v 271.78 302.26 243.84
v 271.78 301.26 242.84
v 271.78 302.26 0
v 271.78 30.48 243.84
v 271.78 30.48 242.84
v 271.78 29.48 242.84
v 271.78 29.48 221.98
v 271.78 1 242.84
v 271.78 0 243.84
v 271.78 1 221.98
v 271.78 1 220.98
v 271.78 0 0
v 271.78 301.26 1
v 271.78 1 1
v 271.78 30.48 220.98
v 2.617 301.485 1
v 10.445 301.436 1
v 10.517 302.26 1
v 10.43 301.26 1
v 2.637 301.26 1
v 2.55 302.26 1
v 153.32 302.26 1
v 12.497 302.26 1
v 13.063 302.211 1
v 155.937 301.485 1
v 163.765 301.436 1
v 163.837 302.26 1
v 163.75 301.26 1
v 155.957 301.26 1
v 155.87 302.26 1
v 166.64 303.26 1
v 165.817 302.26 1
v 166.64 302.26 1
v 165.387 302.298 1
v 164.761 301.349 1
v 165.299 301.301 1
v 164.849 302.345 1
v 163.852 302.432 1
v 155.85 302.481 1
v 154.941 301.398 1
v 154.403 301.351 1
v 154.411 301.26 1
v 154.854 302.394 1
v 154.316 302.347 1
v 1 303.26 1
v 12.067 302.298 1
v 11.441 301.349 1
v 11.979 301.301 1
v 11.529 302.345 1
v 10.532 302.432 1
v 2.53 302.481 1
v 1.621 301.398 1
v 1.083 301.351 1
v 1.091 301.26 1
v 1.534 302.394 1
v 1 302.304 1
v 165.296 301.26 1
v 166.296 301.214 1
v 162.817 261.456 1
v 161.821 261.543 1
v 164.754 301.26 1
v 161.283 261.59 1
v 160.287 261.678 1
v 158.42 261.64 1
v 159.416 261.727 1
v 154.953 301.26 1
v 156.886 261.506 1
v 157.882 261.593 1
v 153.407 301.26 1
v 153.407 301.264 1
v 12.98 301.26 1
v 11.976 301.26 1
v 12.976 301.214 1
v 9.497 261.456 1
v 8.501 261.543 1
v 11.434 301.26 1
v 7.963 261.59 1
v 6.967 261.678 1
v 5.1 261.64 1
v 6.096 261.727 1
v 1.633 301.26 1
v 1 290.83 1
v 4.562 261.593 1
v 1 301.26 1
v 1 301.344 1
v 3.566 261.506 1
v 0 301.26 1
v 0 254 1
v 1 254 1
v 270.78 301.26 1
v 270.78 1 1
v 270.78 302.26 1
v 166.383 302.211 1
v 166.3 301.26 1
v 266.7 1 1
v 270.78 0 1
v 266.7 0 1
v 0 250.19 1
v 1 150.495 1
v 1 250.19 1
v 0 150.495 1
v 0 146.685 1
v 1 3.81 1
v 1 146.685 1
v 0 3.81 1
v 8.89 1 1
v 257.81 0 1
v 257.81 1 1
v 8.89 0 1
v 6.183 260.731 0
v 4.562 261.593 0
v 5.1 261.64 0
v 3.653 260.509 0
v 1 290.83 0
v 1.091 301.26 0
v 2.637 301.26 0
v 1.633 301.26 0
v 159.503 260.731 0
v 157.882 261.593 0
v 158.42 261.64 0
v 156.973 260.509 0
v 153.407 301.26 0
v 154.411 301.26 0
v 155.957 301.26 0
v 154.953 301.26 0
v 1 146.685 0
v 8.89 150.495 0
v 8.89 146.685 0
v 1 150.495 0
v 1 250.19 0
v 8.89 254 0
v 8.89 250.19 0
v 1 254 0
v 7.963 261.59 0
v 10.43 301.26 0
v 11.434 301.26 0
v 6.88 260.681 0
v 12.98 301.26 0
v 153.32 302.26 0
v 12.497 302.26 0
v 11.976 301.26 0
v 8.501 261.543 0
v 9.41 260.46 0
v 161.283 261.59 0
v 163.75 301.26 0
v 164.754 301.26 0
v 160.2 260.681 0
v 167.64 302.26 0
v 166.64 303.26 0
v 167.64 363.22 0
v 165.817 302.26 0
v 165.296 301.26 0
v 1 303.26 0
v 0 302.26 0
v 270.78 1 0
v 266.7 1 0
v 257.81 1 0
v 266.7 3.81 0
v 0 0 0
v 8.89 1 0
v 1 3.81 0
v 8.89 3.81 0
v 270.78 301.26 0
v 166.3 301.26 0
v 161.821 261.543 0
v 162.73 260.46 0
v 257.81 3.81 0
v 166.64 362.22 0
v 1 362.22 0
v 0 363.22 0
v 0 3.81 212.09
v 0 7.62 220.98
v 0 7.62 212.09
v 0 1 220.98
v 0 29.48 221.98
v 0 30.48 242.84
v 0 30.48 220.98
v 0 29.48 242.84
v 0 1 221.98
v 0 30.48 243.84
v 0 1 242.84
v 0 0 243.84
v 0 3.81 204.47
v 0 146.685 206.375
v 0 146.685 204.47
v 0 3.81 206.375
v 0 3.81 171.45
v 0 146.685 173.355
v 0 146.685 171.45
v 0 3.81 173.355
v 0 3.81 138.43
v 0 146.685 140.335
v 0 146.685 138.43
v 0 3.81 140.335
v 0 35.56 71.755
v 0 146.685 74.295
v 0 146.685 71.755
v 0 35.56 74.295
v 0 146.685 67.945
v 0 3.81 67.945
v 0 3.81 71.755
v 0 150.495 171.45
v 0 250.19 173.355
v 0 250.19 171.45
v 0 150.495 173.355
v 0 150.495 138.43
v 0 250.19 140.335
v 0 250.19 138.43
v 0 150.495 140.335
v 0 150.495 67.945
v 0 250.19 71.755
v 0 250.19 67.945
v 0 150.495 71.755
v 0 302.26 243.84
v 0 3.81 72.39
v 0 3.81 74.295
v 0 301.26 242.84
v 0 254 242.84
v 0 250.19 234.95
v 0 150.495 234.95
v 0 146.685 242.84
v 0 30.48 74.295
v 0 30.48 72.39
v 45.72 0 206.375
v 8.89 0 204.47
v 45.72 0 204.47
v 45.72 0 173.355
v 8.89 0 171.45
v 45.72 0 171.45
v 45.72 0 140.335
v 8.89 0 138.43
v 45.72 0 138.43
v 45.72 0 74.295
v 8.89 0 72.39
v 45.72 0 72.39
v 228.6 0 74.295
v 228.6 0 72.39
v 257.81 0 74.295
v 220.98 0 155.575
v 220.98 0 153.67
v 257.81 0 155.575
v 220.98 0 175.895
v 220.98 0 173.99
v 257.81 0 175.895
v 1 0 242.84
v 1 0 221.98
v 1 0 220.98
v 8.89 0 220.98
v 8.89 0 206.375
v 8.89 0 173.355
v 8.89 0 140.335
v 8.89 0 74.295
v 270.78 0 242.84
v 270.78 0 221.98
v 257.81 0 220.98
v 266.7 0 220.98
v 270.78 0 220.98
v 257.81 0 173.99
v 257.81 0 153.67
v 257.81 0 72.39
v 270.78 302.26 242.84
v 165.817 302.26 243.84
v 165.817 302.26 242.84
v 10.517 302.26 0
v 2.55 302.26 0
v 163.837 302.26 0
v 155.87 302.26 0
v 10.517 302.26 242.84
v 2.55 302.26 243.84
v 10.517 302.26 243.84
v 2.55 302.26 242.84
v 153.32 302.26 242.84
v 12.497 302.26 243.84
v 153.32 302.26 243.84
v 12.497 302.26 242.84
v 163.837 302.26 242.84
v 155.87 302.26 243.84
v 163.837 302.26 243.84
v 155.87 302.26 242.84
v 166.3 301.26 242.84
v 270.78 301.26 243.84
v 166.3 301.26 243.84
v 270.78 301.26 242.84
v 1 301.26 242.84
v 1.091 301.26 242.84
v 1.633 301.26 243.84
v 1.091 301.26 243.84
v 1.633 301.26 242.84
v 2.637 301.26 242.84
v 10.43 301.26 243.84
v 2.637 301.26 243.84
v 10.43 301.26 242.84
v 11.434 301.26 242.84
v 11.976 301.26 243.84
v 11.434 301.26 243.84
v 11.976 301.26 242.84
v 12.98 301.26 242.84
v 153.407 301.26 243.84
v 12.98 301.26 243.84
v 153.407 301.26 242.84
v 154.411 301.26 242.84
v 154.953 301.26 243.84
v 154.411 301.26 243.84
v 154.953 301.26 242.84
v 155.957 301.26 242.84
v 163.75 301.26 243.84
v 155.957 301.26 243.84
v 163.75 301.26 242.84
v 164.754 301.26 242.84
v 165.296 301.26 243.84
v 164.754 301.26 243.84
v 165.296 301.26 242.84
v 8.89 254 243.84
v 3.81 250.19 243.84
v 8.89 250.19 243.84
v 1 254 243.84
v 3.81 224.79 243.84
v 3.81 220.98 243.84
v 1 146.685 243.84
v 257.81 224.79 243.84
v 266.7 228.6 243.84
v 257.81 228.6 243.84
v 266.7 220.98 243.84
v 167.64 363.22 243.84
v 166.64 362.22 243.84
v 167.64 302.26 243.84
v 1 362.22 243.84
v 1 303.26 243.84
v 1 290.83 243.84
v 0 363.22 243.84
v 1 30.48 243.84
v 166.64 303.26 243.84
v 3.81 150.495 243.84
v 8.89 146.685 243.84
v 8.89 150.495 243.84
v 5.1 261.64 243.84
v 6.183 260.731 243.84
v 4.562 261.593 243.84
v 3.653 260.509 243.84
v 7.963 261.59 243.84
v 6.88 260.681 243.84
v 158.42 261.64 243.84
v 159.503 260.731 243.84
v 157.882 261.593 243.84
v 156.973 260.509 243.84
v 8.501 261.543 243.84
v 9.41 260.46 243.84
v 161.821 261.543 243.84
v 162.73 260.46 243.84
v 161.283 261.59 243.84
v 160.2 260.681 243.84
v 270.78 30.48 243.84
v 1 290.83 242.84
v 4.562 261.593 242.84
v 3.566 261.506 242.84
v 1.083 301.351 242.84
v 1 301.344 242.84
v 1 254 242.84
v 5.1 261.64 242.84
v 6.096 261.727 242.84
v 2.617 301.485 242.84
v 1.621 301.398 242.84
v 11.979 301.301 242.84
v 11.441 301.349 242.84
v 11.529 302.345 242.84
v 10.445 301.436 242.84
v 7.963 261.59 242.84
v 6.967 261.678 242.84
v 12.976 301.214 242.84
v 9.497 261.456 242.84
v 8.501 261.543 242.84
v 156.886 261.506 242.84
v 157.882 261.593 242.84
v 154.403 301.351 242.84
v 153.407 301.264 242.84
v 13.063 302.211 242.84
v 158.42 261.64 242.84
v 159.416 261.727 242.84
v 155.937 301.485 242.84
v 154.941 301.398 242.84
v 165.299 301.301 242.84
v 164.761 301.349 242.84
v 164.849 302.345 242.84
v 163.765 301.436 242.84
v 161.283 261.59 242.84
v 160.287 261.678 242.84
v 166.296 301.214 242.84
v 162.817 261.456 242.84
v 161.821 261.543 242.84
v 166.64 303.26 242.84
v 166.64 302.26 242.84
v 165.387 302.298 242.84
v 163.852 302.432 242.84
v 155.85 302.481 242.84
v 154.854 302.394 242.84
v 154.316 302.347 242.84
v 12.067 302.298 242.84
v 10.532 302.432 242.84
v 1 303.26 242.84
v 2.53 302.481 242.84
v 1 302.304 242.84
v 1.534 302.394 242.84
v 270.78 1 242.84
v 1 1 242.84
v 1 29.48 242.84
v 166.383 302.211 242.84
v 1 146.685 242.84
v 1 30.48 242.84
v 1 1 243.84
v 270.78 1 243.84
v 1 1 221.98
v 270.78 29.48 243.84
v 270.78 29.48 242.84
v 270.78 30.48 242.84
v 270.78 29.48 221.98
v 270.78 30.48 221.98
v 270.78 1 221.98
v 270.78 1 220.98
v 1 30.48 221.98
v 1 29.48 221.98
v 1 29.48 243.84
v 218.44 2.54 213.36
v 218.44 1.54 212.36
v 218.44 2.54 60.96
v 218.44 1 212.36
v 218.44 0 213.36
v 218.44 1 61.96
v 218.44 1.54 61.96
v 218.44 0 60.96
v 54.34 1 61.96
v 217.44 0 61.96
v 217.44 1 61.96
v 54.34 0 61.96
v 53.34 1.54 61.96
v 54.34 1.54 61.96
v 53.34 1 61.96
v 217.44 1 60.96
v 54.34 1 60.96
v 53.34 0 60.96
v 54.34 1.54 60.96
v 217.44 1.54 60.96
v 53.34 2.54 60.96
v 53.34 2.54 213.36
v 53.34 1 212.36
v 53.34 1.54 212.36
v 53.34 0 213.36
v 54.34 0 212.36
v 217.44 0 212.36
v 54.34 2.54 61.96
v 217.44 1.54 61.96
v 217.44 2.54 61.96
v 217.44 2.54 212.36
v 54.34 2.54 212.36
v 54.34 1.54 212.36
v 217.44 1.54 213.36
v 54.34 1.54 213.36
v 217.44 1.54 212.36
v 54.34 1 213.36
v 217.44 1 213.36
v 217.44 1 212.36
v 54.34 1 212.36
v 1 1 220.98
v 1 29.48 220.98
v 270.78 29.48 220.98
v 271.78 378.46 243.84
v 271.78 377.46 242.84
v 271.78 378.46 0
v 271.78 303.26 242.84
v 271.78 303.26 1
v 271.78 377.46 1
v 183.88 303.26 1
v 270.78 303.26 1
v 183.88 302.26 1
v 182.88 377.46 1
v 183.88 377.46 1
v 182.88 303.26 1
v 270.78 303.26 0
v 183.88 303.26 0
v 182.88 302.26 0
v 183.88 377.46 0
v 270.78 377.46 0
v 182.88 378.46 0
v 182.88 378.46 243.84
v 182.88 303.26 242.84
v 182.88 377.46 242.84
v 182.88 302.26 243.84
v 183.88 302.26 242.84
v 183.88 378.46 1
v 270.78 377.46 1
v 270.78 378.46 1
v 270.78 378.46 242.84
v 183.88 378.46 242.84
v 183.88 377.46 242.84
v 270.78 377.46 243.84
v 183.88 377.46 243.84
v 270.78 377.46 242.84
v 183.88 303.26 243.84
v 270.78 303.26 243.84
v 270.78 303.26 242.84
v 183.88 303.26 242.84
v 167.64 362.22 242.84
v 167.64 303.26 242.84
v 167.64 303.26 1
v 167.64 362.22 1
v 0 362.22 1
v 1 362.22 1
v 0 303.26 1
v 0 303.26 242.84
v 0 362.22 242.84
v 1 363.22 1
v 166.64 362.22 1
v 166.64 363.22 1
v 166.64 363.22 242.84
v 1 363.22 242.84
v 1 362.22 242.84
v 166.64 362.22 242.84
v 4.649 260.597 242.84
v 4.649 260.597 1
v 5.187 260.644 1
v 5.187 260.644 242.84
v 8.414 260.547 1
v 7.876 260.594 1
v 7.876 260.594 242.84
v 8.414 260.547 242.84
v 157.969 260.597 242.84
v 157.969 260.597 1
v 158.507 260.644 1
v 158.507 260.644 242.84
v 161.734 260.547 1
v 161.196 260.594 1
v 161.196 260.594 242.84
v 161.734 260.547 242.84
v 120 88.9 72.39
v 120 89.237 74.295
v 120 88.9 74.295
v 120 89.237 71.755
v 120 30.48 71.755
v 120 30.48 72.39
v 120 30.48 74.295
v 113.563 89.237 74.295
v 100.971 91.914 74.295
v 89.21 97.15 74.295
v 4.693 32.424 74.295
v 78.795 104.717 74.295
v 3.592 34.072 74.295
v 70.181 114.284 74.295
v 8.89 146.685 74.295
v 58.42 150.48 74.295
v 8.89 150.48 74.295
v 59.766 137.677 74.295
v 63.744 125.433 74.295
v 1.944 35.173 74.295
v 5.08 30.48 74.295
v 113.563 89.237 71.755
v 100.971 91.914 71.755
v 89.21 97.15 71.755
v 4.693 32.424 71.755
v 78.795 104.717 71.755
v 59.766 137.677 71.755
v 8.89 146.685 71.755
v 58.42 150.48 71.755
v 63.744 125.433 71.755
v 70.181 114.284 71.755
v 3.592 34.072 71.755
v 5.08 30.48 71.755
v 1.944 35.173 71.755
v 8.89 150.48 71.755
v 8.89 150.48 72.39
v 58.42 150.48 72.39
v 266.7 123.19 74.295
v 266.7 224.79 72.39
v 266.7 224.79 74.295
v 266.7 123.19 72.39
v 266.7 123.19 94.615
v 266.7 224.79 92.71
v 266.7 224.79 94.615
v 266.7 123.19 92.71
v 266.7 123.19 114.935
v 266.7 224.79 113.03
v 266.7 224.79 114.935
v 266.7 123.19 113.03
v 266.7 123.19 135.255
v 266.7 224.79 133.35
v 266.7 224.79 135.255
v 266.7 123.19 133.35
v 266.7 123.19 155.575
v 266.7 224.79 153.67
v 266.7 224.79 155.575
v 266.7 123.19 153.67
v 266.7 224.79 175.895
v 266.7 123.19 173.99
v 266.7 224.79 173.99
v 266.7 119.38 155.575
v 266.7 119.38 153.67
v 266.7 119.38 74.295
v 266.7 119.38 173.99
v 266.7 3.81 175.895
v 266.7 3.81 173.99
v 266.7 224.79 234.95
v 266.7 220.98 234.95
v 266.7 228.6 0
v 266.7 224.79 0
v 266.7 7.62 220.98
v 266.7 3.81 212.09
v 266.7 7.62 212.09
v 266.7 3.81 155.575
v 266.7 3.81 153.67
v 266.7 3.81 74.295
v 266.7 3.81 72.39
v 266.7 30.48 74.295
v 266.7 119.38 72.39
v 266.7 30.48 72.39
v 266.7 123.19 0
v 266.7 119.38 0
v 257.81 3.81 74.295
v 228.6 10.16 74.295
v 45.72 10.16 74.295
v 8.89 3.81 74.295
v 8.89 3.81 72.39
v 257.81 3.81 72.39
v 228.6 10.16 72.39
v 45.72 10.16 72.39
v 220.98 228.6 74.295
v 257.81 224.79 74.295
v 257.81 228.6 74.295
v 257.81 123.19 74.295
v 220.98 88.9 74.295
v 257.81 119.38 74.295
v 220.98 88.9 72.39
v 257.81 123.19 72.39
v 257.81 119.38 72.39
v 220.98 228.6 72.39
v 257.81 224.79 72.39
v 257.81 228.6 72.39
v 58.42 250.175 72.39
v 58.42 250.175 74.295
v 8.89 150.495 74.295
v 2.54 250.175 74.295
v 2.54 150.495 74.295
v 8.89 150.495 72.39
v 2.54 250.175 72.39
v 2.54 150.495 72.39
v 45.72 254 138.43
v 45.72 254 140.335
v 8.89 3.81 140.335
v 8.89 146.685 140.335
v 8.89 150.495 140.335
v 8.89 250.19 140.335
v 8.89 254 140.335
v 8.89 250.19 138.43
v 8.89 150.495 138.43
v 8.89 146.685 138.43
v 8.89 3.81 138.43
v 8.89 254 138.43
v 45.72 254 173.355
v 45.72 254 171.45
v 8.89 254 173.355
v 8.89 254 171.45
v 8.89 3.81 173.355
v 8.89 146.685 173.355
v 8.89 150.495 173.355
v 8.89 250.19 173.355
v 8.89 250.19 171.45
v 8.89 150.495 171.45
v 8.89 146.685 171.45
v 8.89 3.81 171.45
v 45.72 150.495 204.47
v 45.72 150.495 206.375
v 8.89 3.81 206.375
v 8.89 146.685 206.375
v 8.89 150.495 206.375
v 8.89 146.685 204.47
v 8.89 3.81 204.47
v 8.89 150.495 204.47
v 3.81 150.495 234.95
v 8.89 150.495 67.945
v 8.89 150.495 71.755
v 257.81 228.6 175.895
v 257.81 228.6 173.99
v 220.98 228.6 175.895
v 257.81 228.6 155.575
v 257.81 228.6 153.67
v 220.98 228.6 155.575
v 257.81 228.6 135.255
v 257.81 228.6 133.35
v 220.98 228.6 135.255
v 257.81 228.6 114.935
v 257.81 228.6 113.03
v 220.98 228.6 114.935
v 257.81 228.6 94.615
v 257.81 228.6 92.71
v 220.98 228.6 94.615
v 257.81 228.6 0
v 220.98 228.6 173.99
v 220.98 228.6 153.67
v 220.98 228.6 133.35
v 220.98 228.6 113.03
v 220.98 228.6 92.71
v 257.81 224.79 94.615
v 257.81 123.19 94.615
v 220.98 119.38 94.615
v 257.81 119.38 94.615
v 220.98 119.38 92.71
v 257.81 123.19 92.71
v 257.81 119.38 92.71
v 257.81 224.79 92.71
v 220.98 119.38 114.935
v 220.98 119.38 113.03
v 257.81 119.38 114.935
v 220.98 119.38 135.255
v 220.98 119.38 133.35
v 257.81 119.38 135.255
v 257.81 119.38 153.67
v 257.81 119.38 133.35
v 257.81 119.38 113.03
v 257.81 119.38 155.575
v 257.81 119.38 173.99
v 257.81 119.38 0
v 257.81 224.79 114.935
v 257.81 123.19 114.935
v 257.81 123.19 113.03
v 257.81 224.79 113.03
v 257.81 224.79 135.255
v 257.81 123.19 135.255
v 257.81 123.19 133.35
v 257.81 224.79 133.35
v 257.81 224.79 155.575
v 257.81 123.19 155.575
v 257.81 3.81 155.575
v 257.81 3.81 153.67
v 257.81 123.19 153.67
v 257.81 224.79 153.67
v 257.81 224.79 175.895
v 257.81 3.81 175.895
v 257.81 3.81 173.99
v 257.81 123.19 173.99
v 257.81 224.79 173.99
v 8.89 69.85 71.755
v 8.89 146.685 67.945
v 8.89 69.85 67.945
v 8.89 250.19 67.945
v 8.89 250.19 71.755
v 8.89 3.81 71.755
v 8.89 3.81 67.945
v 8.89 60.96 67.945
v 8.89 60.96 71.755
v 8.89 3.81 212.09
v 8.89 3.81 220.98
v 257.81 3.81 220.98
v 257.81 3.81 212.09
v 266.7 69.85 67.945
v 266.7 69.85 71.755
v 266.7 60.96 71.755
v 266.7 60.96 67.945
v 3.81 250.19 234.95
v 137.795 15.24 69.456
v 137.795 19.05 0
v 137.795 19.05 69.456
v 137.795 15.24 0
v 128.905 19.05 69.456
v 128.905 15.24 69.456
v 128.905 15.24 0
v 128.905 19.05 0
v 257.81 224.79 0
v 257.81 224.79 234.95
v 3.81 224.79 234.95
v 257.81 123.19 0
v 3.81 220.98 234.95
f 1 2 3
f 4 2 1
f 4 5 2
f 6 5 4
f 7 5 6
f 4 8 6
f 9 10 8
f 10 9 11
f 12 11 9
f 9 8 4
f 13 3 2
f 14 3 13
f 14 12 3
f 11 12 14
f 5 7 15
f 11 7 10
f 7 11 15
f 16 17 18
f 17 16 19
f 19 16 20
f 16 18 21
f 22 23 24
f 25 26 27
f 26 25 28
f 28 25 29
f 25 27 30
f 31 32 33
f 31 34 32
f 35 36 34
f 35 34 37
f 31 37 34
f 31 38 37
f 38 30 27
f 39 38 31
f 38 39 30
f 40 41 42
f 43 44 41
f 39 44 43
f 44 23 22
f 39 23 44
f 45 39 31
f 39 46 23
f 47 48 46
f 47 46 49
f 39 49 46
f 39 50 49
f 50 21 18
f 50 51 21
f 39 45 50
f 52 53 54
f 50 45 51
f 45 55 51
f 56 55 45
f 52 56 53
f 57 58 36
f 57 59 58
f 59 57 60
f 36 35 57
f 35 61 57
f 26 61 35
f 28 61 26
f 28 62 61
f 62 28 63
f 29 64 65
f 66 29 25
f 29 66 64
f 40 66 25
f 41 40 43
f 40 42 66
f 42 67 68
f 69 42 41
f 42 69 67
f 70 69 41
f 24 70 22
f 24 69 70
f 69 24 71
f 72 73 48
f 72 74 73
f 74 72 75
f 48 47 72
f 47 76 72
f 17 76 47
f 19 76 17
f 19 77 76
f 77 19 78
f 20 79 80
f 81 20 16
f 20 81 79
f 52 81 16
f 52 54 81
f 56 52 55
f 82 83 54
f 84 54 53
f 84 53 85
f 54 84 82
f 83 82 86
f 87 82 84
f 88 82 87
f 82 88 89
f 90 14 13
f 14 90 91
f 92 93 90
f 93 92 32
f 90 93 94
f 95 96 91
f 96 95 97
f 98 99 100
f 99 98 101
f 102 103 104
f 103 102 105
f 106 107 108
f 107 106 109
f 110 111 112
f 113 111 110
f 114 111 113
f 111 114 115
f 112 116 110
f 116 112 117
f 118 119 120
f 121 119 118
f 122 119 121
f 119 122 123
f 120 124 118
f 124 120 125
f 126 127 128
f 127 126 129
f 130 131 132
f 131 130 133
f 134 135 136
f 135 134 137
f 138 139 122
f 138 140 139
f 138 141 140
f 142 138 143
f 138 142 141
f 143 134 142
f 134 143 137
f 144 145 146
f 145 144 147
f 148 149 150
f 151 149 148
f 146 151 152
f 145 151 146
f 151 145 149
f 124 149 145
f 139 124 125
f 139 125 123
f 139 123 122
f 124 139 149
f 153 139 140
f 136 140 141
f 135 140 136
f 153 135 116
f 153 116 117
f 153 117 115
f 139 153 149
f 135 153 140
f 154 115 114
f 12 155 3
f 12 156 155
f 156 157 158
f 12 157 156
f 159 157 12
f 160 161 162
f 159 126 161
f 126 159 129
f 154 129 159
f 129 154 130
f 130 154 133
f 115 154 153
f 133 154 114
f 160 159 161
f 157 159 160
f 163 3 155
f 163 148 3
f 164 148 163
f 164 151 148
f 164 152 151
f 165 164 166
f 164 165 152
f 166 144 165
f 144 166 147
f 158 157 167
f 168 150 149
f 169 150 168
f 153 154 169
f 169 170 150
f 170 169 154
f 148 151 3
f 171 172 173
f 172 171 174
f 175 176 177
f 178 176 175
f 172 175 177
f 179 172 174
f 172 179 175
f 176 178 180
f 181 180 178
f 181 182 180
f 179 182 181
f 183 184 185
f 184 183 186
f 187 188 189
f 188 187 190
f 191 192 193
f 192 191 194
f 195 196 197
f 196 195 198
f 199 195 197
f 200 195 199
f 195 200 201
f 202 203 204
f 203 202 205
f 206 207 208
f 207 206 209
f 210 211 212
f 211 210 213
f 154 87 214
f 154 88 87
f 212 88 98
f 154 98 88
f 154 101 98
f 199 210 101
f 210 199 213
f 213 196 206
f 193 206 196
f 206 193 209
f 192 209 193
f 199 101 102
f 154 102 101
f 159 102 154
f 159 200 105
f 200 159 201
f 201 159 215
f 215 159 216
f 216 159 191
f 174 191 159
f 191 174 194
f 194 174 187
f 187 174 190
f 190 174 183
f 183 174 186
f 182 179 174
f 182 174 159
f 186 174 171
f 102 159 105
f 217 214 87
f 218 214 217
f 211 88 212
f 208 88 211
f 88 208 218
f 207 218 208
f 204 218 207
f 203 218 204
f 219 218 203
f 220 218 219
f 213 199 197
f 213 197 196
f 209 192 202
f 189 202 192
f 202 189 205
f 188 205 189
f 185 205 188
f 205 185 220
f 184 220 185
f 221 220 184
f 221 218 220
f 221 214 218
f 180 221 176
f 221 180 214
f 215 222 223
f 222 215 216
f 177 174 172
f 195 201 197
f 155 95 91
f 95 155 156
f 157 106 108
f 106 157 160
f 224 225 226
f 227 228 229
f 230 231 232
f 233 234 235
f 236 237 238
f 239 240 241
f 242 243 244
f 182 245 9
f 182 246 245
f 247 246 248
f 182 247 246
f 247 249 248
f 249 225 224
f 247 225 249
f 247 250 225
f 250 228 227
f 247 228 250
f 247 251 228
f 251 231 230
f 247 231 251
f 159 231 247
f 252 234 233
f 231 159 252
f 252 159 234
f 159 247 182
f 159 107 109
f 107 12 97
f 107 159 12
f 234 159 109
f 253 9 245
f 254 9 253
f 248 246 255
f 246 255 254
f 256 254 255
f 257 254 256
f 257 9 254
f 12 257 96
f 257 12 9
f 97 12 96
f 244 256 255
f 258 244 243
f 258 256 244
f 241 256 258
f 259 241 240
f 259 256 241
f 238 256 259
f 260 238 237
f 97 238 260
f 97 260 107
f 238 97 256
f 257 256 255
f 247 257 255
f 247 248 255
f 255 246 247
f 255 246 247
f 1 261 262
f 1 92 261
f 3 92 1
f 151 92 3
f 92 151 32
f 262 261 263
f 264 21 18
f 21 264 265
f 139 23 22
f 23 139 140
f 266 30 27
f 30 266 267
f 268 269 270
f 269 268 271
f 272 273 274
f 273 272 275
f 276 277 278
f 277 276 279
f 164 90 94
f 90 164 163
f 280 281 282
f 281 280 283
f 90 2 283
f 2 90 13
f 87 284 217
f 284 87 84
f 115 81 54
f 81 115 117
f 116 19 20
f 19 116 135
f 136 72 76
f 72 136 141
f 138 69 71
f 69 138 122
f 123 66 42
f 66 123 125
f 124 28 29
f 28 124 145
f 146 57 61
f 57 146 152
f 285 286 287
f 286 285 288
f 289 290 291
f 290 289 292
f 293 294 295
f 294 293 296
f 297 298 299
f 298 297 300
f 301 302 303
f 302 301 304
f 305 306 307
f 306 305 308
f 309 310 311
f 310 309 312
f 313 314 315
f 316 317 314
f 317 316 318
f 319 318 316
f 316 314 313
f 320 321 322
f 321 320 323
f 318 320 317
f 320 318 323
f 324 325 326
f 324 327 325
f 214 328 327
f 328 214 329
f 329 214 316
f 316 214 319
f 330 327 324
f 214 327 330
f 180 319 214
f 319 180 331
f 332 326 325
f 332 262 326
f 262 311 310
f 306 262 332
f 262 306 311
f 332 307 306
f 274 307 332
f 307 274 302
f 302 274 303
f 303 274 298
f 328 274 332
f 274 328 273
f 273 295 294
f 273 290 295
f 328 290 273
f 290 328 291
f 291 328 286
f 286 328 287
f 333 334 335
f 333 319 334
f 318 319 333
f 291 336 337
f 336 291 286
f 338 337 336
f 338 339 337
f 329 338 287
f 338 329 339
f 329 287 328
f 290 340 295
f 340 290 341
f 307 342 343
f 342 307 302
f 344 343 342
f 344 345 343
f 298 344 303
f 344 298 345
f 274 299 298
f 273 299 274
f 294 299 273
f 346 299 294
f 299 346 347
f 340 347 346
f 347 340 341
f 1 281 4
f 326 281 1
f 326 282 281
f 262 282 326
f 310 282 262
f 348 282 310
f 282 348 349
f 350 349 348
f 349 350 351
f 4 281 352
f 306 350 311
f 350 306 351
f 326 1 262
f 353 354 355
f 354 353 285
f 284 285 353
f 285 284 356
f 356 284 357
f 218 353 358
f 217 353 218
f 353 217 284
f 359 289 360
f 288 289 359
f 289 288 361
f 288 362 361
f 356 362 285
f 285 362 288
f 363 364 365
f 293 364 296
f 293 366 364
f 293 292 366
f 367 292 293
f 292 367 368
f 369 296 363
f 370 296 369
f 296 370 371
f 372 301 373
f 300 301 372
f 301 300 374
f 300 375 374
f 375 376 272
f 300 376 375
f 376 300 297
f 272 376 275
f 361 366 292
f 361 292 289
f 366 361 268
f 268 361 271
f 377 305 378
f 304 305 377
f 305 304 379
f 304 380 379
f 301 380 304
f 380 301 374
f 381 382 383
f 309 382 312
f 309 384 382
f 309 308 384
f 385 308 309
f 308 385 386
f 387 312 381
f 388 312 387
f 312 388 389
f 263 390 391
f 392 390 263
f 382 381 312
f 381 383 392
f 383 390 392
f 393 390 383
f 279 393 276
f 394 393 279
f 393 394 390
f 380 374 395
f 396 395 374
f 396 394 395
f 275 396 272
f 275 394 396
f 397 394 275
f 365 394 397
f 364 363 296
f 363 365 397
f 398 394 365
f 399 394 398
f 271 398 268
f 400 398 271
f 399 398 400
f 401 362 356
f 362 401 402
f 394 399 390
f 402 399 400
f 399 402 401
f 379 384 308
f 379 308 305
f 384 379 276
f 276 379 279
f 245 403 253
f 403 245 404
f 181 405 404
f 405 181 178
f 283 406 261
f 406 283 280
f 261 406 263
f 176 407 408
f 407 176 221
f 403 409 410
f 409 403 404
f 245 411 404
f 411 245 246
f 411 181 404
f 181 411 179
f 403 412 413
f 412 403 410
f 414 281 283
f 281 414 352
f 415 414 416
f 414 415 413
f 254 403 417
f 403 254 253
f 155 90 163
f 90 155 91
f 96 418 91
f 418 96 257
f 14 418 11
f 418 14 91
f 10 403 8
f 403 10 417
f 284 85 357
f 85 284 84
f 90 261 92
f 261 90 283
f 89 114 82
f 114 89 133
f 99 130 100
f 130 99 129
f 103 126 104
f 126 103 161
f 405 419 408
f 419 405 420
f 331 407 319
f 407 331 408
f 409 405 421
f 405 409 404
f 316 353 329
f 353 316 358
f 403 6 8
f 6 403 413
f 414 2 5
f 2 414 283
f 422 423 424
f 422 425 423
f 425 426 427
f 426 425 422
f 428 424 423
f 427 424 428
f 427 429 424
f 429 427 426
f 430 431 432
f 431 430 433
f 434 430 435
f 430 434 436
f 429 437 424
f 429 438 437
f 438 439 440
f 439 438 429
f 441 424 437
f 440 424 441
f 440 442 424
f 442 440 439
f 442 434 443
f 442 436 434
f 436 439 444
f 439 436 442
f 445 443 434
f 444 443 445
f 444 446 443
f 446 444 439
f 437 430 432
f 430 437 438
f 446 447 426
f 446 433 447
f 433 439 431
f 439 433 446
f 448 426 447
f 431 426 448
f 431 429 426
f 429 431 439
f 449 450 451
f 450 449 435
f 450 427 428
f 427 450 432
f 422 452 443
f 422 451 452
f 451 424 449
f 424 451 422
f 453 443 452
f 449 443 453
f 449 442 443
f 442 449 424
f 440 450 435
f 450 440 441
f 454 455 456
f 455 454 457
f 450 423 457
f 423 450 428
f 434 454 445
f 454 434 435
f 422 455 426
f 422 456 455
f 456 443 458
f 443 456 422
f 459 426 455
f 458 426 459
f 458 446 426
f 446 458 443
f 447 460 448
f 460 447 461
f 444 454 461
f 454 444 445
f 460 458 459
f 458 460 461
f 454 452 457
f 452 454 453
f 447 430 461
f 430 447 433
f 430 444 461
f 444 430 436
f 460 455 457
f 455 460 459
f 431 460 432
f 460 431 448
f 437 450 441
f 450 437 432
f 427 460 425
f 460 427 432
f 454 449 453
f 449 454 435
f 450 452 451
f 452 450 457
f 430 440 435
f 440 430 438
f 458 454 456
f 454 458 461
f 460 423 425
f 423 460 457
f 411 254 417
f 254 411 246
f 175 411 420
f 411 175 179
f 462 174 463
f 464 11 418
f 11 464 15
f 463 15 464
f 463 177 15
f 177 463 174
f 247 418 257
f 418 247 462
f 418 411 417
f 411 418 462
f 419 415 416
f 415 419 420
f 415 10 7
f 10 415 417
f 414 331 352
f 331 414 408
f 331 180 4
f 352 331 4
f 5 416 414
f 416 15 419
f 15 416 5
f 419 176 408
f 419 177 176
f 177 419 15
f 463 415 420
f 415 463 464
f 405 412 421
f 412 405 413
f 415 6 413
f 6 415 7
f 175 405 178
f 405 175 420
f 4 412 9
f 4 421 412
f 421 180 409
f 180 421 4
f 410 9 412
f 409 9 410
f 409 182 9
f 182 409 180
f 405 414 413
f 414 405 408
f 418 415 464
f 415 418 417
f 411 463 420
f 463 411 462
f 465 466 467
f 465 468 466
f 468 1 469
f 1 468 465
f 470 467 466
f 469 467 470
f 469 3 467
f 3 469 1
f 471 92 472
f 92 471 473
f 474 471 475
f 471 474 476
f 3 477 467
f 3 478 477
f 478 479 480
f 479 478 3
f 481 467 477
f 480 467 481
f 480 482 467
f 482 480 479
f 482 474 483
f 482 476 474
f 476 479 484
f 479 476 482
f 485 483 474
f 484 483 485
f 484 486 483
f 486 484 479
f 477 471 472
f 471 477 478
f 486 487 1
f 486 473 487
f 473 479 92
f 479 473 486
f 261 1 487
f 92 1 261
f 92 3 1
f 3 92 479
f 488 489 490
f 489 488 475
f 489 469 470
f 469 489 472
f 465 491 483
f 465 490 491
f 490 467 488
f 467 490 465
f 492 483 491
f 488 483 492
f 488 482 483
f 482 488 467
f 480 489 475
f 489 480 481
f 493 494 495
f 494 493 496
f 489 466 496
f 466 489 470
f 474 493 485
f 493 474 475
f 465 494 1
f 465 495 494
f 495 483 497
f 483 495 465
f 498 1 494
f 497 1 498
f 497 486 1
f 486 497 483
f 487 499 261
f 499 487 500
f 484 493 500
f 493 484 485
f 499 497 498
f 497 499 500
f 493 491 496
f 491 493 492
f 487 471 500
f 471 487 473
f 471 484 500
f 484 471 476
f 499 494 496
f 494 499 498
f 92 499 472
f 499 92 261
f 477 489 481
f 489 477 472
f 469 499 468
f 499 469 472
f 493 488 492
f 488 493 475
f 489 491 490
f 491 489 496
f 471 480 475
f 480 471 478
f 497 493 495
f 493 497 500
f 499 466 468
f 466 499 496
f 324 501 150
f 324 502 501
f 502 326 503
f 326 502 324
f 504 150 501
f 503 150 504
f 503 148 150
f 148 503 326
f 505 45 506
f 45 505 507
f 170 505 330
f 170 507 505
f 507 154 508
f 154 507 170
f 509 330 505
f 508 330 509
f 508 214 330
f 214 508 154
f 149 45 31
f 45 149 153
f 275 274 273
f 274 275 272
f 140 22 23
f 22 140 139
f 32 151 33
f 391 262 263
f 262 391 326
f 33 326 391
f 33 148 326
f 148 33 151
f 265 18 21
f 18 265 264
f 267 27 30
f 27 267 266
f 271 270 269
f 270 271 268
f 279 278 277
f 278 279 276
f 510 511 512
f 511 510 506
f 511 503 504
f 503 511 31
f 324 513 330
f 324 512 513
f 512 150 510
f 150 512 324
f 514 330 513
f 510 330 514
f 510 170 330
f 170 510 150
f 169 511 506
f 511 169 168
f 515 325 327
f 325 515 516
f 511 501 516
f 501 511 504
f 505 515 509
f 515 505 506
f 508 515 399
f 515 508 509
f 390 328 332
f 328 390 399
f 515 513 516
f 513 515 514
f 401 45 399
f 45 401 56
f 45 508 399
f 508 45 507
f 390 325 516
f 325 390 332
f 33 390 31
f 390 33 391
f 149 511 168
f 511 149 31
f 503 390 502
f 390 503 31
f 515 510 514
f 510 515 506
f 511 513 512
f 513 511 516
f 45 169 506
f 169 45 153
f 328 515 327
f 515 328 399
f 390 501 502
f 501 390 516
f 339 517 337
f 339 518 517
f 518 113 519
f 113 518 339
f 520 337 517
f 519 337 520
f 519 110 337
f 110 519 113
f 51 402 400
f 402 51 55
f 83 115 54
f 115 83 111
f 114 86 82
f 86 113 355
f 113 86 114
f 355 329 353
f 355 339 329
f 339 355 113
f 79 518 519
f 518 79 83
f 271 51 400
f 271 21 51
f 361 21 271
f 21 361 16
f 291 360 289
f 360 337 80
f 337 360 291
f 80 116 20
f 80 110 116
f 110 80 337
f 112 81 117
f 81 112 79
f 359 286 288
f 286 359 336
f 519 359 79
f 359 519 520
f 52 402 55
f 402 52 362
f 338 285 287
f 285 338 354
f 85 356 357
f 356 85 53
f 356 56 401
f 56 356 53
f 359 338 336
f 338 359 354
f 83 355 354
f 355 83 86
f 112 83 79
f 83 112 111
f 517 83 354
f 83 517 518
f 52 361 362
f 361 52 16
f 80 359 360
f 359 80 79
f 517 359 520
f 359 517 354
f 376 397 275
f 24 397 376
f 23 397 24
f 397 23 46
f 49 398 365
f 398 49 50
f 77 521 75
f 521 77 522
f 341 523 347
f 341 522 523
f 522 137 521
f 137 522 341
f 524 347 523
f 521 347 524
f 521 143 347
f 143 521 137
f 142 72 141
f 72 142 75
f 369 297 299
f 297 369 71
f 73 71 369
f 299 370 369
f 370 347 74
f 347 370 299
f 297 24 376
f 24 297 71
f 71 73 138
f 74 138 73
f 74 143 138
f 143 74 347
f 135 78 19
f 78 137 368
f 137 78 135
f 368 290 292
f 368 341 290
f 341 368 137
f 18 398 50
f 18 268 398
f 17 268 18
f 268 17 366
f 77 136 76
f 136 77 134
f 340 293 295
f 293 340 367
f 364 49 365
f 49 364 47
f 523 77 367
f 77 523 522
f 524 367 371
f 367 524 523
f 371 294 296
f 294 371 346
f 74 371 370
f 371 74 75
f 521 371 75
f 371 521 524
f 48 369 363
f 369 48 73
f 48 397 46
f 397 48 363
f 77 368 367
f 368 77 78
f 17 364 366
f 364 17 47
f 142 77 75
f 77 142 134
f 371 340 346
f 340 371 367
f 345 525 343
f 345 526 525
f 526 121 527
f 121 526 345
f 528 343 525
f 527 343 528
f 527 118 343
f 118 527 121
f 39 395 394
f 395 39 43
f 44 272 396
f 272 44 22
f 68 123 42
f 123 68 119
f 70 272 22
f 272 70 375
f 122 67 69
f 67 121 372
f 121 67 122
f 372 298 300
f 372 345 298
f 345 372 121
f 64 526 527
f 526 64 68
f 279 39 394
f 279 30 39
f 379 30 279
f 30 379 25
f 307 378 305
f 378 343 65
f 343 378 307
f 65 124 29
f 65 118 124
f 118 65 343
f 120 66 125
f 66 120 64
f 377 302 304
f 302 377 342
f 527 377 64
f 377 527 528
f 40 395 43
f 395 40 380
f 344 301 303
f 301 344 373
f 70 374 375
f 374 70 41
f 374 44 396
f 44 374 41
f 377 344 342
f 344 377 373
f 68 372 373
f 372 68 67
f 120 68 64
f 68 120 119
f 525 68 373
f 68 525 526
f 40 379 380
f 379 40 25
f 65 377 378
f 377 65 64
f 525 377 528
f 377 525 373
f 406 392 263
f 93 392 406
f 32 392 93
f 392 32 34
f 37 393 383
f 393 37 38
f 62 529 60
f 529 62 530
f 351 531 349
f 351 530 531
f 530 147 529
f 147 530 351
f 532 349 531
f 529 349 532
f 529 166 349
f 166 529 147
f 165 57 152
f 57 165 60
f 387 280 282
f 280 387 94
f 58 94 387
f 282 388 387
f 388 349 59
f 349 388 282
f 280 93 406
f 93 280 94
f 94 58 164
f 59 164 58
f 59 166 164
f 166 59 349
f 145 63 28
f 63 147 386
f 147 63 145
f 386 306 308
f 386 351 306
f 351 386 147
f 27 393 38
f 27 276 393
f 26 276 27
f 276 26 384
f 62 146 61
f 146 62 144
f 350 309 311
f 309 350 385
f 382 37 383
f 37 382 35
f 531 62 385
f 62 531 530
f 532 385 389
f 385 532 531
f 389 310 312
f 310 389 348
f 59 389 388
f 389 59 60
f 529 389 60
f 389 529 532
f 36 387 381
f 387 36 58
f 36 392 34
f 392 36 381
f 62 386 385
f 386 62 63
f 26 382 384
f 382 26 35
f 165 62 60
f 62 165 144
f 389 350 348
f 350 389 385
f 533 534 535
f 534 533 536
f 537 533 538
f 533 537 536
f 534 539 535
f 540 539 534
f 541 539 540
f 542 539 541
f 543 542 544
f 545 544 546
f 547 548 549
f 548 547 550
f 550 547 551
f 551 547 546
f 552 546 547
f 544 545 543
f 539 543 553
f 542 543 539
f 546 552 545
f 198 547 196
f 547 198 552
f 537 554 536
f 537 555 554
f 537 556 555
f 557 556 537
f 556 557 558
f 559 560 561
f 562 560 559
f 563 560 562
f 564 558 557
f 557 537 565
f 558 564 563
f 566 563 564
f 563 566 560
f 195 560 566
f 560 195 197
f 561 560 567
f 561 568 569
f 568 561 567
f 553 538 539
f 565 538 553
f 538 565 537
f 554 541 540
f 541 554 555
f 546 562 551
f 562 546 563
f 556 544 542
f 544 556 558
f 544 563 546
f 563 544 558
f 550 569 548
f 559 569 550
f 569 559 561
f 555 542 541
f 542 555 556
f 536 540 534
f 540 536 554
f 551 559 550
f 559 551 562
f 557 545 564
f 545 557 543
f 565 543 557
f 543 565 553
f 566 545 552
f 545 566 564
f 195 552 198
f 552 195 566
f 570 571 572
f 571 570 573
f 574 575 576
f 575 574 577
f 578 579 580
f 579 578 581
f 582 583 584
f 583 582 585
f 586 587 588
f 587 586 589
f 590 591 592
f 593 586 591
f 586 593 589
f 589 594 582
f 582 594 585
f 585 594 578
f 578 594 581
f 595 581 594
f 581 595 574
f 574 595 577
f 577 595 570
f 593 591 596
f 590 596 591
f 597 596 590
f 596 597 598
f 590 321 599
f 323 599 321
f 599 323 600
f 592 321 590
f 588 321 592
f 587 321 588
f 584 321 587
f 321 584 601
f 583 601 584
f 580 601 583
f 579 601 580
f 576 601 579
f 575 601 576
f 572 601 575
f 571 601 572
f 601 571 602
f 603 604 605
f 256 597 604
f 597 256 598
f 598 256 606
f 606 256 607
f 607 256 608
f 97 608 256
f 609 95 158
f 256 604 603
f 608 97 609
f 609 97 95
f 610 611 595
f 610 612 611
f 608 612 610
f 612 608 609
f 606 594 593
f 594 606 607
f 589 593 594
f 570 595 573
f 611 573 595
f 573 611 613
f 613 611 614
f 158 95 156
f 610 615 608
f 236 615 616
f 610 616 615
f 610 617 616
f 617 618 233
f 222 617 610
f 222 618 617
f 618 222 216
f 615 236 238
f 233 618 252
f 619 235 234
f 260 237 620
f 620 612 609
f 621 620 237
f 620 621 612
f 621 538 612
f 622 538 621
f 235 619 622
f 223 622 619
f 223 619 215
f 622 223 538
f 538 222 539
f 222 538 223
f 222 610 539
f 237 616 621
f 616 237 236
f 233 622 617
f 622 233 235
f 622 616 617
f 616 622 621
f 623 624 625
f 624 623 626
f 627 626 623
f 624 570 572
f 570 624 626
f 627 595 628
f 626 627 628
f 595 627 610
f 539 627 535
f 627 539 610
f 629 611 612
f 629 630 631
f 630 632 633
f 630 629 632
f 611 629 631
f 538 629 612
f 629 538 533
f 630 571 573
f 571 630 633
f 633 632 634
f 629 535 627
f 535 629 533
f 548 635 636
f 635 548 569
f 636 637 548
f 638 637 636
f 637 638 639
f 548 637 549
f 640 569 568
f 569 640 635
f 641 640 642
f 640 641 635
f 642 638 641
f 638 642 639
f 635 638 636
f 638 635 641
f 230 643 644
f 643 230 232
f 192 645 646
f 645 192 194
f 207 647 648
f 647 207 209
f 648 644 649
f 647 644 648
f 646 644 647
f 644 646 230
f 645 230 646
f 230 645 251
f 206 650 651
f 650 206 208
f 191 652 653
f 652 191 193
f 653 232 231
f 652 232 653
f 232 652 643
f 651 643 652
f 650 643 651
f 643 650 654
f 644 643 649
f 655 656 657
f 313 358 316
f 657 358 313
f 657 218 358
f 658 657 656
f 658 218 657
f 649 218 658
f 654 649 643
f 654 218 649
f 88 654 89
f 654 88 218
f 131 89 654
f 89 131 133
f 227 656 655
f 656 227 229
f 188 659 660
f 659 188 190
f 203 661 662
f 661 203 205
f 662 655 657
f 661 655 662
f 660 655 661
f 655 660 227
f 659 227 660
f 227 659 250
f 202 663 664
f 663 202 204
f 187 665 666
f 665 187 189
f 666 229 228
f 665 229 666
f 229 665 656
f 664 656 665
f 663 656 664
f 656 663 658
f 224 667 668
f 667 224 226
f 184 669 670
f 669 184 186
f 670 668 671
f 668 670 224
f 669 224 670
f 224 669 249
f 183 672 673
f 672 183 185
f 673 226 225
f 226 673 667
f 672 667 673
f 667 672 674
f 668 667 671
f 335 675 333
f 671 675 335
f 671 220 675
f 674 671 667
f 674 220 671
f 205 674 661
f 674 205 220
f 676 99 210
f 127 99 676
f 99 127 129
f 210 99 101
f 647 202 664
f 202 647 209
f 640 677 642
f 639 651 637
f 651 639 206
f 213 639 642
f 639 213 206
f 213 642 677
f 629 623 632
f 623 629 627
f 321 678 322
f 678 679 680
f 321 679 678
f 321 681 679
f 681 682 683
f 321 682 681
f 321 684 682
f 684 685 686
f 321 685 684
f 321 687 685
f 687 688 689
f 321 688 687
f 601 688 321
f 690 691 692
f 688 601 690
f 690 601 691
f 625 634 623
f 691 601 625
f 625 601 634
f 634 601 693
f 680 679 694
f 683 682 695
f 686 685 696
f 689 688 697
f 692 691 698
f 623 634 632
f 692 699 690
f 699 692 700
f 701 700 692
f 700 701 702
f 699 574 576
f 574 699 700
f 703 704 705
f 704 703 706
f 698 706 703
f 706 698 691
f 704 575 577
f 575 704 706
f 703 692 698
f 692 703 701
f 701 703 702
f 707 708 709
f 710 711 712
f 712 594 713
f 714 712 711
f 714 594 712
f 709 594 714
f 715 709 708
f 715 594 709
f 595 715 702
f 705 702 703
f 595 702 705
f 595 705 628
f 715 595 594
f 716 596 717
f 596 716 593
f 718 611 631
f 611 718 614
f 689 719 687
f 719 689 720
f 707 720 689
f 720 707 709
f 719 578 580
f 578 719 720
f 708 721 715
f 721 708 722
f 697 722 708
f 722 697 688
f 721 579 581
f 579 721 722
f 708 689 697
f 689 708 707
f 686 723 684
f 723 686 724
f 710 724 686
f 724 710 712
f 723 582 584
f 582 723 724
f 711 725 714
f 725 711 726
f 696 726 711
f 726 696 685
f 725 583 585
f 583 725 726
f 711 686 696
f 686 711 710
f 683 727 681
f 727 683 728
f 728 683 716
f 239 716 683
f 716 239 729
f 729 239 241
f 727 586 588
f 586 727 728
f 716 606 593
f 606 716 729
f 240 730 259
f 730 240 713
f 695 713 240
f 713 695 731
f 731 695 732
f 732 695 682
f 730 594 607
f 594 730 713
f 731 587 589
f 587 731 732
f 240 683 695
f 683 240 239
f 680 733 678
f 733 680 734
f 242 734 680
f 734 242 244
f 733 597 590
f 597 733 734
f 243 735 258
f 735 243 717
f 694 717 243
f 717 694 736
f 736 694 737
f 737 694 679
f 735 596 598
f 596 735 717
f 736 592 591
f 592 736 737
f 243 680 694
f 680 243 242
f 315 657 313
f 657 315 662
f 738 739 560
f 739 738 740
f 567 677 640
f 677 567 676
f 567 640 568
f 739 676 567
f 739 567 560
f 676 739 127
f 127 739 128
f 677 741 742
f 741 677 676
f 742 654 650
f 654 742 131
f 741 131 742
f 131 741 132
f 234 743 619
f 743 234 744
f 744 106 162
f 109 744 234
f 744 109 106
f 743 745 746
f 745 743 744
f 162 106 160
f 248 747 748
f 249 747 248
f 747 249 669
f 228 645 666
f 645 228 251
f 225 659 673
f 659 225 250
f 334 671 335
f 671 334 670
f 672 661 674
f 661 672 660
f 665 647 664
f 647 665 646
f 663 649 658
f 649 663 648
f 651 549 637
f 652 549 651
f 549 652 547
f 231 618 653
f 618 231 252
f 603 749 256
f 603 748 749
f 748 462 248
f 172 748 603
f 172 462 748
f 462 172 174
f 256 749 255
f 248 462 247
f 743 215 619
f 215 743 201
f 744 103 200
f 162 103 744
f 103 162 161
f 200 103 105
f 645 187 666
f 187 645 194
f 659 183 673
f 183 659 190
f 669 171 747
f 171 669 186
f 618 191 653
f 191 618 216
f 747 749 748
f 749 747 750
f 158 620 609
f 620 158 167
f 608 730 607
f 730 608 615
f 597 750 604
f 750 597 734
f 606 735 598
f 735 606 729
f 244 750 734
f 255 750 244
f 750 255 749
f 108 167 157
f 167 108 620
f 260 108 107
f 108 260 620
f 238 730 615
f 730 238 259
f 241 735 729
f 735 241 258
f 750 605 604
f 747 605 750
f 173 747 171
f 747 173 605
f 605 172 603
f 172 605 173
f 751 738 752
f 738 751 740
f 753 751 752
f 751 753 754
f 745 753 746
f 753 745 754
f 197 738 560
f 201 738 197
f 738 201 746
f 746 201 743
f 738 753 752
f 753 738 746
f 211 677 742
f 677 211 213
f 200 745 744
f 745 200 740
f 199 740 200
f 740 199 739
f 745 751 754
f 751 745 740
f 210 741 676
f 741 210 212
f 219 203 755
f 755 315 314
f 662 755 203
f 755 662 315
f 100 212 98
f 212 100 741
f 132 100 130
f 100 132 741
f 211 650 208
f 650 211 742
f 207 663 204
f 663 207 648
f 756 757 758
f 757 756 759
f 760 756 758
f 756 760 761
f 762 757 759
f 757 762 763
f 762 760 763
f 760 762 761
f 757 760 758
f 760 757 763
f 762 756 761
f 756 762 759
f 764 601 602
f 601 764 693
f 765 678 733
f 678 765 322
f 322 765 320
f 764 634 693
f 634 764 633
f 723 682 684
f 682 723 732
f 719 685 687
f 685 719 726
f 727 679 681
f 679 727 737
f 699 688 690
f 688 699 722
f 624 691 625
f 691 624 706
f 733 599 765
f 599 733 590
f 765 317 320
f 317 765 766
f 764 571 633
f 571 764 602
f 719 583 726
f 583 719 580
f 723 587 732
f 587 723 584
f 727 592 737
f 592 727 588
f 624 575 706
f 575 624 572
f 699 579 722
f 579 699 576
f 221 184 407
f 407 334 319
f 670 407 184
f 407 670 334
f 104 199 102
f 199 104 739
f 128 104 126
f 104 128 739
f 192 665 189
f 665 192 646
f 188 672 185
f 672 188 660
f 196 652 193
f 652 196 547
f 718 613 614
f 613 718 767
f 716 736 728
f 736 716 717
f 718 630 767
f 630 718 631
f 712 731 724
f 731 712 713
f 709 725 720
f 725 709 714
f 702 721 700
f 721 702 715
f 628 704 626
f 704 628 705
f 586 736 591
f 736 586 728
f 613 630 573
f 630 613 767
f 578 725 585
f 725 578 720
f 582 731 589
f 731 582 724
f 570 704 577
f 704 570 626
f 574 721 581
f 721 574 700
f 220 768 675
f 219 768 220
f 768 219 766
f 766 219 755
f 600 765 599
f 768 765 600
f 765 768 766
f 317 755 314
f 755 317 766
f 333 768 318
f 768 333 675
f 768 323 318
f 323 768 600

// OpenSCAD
// file: functions.scad
function in(i) = i * 2.54;
function ft(f, i=0) = in(f*12+i);
// file: panels.scad
include <functions.scad>;
include <dimensions.scad>;

module corner_table() {
    color([0.9, 0.9, 0.9])
    difference() {
        cube([120, 120, in(1)]);
        translate([120,120,-1])
        cylinder(r=120-ft(1,11), h=in(3));
        
        translate([0,0,-1])
        cylinder(r=in(2), h=in(3));
    }
}

module front_table_window_insert() {
    difference() {
        cube([room_x,ft(1),in(0.75)]);
        translate([ft(1.5),0,-1])
        cube([ft(6), in(4), in(3)]);
    }
}

module left_table() {
    cube([ft(1.5), ft(4,7), in(0.75)]);
}

module front_left_table() {
    cube([room_x-120, ft(1,11), in(0.75)]);
}


module left_upper_shelf_1() {
    cube([ft(1.5), ft(3,7), in(0.75)]);
}

module left_upper_shelf_2() {
    cube([ft(1.5), ft(3,7), in(0.75)]);
}

module left_upper_shelf_3() {
    cube([ft(1.5), ft(3,7), in(0.75)]);
}

module left_upper_shelf_4() {
    cube([ft(1.5), ft(7,6), in(0.75)]);
}

module left_upper_shelf_5() {
    cube([ft(1.5), ft(7,6), in(0.75)]);
}

module left_lower_shelf() {
    cube([ft(1.5), ft(3,6), in(0.75)]);
}

module right_hinged_table() {
    cube([ft(1,10), ft(3,4.75) - in(1.5), in(0.75)]);
}


module right_upper_shelf_1() {
    cube([ft(1.5), ft(8,4), in(0.75)]);
}

module right_upper_shelf_2() {
    cube([ft(1.5), ft(8,4), in(0.75)]);
}

module right_upper_shelf_3() {
    cube([ft(1.5), ft(4,11.25), in(0.75)]);
}
// file: room.scad
include <functions.scad>;

room_x = ft(8,11);
room_y = ft(9,11);
room_z = ft(8);

wireframe_t = 1;

closet_x = 1.375;

module closet_door() {
    wireframe_cube([ft(closet_x), in(1), room_z], wireframe_t);
}

module wireframe_cube(vect, wireframe_t=5) {
    room_x = vect[0];
    room_y = vect[1];
    room_z = vect[2];

    // along the x axis (short dimension of the room)
    cube([room_x, wireframe_t, wireframe_t]);
    
    translate([0,room_y-wireframe_t,0])
    cube([room_x, wireframe_t, wireframe_t]);

    translate([0,0,room_z-wireframe_t])
    cube([room_x, wireframe_t, wireframe_t]);
    
    translate([0,room_y-wireframe_t,room_z-wireframe_t])
    cube([room_x, wireframe_t, wireframe_t]);

    // verticals
    cube([wireframe_t, wireframe_t, room_z]);
    
    translate([room_x-wireframe_t, 0, 0])
    cube([wireframe_t, wireframe_t, room_z]);
    
    translate([0, room_y-wireframe_t, 0])
    cube([wireframe_t, wireframe_t, room_z]);
    
    translate([room_x-wireframe_t, room_y-wireframe_t, 0])
    cube([wireframe_t, wireframe_t, room_z]);
    
    // along the y axis (long dimension of the room)
    
    cube([wireframe_t, room_y, wireframe_t]);
    
    translate([0, 0, room_z-wireframe_t])
    cube([wireframe_t, room_y, wireframe_t]);

    translate([room_x-wireframe_t, 0, room_z-wireframe_t])
    cube([wireframe_t, room_y, wireframe_t]);
    
    translate([room_x-wireframe_t, 0, 0])
    cube([wireframe_t, room_y, wireframe_t]);
}

module room_wireframe() {
    // room
    wireframe_cube([room_x, room_y, room_z], wireframe_t);
    
    // window
    translate([ft(1.75),0,ft(2)])
    wireframe_cube([ft(5,5), in(1), ft(5)], wireframe_t);
    
    // above window
    translate([0,0,room_z-in(9)])
    wireframe_cube([room_x, ft(1), in(9)], wireframe_t);
    

    // entry
    translate([room_x-ft(2,11),room_y,0])
    wireframe_cube([ft(2,11),ft(2,6),ft(8)], wireframe_t);

    // closet
    translate([0,room_y,0])
    wireframe_cube([ft(5,6),ft(2),ft(8)], wireframe_t);


    translate([0,room_y,0]) {
        rotate([0,0,-85])
        closet_door();
        
        translate([ft(closet_x)*1-32.5,-41.8,0])
        rotate([0,0,85])
        closet_door();
        
        
        translate([ft(closet_x)*2+69.5,0,0])
        rotate([0,0,-85])
        closet_door();
        
        translate([ft(closet_x)*3+37,-41.8,0])
        rotate([0,0,85])
        closet_door();
    }
    
}



room_wireframe();
// file: dimensions.scad
include <functions.scad>;

room_x = ft(8,11) - in(2); // room for padding on either side
room_y = ft(9,11) - in(2); // room for padding against the window side
room_z = ft(8) - in(3); // room for lots of padding underneath, and ceiling clearance

wireframe_t = 1;

closet_x = 1.375;
// main file
include <dimensions.scad>;
use <room.scad>;
use <panels.scad>;

PI=3.1415;

enableAnimation = true;
showPivots = true;

table_z = 29.25;

//anim_t = enableAnimation ? 1-$t : 0;

// smooth loop
anim_t = enableAnimation ? cos(($t+0.5)*360)/2+0.5 : 0;


echo(anim_t);

color("white")
room_wireframe();

// MAIN DESK

translate([0,ft(1),in(table_z-1)])
corner_table();

translate([0, 0, in(table_z)-in(0.75)])
front_table_window_insert();

translate([120,ft(1),in(table_z)-in(0.75)])
front_left_table();

// RIGHT

translate([in(1), ft(1)+120, in(table_z-0.75)])
rotate([0,anim_t*-90,0])
right_hinged_table();

translate([0,0,in(table_z-0.75) + ft(2,2)])
right_upper_shelf_1();

translate([0,0,in(table_z-0.75) + ft(3,3)])
right_upper_shelf_2();

translate([0,0,in(table_z-0.75) + ft(4,4)])
right_upper_shelf_3();

// LEFT

translate([room_x-ft(1.5),ft(2,11),in(table_z-0.75)])
left_table();

translate([room_x-ft(1.5),ft(3,11),in(table_z-0.75) + in(8)])
left_upper_shelf_1();

translate([room_x-ft(1.5),ft(3,11),in(table_z-0.75) + in(16)])
left_upper_shelf_2();

translate([room_x-ft(1.5),ft(3,11),in(table_z-0.75) + in(24)])
left_upper_shelf_3();

translate([room_x-ft(1.5),0,in(table_z-0.75) + in(32)])
left_upper_shelf_4();

translate([room_x-ft(1.5),0,in(table_z-0.75) + in(40)])
left_upper_shelf_5();

module stud(l) {
    cube([in(3.5), in(1.5), l]);
}

// supports

// front right corner
translate([0,0, 0])
stud(ft(7,3));

// front left corner
translate([room_x-in(3.5),0, 0])
stud(ft(7,3));

// front top crossbeam
translate([0,in(1.5),ft(7,3)])
rotate([0,90,0])
stud(room_x);

// under front desk crossbeam
// TODO: don't forget need 0.25" spacers on left!!
translate([0,ft(2),in(table_z-1-1.5)])
rotate([0,90,0])
rotate([0,0,90])
stud(room_x);

// under right desk crossbeam
// TODO: don't forget need 0.25" spacers under hinghed surface!!
translate([in(3.5),in(1.5),in(table_z-1-1.5)])
rotate([0,90,90])
rotate([0,0,90])
stud(ft(8,1));


// support under front desk
translate([(room_x-in(3.5))/2,in(6),0])
stud(in(table_z-in(0.75)));

// right rear corner
translate([0,ft(8,4) - in(1.5), 0])
stud(ft(8));

// left rear corner
translate([room_x-in(3.5),ft(7,6)-in(1.5),0])
stud(ft(8));

// right wall middle
translate([0,ft(4,11.25) - in(1.5), 0])
stud(ft(8));

// left wall middle
translate([room_x-in(3.5),ft(4,0.5)-in(1.5),0])
stud(ft(5,8.5));

// left wall top rear
*translate([room_x-in(1.5),ft(4,0.5),room_z-in(3.5)])
rotate([0,-90,0])
rotate([-90,0,0])
stud(ft(3,4));

// right wall top rear
translate([0,ft(4,11),room_z-in(0.5)])
rotate([0,-90,0])
rotate([-90,0,0])
stud(ft(3,3.5));

// rear top crossbeam
translate([in(1.5),ft(7,3),ft(8)])
rotate([0,90,0])
stud(room_x-in(1.5));
